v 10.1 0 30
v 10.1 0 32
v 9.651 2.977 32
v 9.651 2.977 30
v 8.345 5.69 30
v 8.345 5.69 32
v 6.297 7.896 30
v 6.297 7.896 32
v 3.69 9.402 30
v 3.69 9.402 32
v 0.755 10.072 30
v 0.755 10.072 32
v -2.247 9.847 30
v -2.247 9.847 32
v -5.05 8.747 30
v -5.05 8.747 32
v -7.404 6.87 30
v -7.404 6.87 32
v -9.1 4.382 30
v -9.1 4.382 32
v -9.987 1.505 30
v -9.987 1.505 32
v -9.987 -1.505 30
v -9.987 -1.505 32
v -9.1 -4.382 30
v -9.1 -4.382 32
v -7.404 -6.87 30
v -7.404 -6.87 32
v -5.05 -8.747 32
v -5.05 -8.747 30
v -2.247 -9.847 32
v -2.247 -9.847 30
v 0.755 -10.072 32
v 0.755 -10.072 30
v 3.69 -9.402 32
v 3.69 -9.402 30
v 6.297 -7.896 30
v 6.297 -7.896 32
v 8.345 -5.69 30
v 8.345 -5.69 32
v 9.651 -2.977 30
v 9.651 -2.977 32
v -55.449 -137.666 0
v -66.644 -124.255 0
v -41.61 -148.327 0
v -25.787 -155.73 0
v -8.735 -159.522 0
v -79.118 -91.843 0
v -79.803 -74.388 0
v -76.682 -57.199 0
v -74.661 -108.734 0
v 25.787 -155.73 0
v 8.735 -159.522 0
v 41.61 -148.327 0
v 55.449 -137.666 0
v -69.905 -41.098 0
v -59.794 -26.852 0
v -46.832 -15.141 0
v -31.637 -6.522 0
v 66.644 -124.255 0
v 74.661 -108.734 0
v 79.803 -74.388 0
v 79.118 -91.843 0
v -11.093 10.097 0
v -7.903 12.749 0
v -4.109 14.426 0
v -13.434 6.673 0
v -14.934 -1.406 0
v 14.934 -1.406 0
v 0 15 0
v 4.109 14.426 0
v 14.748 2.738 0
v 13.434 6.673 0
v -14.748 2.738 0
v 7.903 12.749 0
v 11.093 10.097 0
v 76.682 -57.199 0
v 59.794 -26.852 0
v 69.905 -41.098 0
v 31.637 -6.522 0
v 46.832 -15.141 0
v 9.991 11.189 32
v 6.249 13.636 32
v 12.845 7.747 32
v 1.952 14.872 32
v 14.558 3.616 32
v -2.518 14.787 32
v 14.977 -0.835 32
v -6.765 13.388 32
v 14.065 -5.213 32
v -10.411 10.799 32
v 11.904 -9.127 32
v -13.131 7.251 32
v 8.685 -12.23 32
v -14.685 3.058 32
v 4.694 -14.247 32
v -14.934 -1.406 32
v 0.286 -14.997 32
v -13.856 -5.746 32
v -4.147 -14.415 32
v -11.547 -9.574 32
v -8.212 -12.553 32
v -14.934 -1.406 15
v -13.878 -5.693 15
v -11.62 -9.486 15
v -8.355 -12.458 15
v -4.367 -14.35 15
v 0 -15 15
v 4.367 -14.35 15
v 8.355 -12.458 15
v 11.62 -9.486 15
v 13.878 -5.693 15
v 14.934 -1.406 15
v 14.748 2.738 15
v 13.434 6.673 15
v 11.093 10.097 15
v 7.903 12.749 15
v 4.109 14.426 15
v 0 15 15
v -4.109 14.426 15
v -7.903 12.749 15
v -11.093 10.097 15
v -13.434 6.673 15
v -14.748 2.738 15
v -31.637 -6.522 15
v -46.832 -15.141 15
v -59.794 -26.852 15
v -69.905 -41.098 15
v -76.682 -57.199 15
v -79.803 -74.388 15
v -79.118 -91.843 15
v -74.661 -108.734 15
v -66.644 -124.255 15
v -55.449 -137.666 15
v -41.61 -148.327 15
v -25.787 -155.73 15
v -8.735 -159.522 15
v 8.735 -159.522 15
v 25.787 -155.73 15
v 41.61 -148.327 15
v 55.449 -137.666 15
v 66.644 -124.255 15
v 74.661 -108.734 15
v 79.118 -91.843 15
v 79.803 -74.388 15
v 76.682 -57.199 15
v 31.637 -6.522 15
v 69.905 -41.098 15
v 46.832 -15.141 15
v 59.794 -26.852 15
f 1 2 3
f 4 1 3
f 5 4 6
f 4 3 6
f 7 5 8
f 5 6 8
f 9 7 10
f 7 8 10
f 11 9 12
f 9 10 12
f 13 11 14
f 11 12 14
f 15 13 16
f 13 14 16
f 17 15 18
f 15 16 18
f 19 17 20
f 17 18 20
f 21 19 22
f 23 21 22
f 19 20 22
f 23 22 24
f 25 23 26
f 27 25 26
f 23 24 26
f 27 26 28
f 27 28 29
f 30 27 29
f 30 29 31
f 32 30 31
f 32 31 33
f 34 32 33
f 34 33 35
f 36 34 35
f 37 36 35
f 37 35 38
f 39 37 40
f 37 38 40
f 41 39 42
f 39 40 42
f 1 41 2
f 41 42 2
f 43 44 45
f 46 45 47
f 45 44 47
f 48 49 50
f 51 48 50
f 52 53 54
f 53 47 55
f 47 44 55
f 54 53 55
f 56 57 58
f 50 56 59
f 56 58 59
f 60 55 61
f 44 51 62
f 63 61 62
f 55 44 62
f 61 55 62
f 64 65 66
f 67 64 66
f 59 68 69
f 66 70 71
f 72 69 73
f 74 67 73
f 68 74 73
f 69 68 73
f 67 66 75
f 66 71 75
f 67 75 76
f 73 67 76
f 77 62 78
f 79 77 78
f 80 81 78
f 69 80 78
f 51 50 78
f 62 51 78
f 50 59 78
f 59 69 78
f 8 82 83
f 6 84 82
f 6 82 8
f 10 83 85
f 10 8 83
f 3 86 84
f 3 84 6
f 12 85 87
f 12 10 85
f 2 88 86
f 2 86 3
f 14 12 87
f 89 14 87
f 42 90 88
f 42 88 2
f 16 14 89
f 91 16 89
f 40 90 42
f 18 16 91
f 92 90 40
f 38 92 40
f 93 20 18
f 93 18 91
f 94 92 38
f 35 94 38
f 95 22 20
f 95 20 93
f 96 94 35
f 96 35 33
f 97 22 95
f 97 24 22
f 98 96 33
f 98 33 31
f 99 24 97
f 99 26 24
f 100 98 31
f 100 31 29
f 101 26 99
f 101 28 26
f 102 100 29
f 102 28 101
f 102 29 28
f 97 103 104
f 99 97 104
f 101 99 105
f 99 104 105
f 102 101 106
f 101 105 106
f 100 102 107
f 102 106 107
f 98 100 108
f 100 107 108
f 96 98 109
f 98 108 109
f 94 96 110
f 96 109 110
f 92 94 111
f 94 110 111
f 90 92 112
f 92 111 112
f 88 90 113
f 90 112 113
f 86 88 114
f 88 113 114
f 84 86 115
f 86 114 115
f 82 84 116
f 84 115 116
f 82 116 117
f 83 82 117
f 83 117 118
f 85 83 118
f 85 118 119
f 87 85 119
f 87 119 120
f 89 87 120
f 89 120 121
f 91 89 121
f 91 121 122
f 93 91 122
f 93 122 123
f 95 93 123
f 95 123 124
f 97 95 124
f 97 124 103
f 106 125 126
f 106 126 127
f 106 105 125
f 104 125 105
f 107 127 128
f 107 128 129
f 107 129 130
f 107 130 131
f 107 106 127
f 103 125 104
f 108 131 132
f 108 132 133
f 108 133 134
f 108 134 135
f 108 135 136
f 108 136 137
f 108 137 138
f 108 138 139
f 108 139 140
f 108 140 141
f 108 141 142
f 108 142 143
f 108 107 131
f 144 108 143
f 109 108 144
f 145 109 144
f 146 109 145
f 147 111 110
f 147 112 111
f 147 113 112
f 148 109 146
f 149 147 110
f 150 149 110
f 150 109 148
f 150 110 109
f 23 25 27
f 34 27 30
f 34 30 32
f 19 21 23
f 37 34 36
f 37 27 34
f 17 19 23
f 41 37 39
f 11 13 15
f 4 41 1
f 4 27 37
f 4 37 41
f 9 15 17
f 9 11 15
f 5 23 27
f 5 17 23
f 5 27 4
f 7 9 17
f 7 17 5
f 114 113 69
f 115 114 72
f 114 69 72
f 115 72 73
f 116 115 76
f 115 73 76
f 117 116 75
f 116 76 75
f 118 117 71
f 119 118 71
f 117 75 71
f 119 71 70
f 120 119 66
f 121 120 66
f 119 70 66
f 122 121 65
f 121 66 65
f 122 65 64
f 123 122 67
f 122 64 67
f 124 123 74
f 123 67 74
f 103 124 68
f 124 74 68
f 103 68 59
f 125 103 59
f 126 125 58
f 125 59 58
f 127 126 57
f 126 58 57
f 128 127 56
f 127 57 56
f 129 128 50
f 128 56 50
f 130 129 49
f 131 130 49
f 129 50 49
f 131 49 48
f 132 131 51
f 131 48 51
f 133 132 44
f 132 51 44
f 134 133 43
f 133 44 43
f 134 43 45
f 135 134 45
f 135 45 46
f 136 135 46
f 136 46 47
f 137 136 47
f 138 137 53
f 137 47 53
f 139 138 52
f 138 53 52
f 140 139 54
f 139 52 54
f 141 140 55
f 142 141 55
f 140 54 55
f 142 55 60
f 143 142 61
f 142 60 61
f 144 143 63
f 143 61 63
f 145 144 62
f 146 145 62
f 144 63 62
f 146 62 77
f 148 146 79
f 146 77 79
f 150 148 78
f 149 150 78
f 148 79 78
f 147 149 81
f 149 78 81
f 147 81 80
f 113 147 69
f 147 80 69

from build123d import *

# Parameters (mm, degrees)
EXTRUDE_1_DEPTH     = 15
SKETCH_5_R          = 15
EXTRUDE_3_DEPTH     = 17
SKETCH_9_R          = 10.1
CUT_EXTRUDE_2_DEPTH = 2


with BuildPart() as part:
    # ｽｹｯﾁ4 → ﾎﾞｽ - 押し出し1 (new body)
    with BuildSketch(Plane.XY):
        with BuildLine():
            ThreePointArc((14.933936552, -1.40625), (0, 15), (-14.933936552, -1.40625))
            ThreePointArc((-14.933936552, -1.40625), (0, -160), (14.933936552, -1.40625))
        make_face()
    extrude(amount=EXTRUDE_1_DEPTH)

    # ｽｹｯﾁ5 → ﾎﾞｽ - 押し出し3 (add)
    with BuildSketch(Plane.XY.offset(15)):
        with Locations(Location((0, 0, 0), (0, 0, 185.379378991))):
            Circle(SKETCH_5_R)
    extrude(amount=EXTRUDE_3_DEPTH)

    # ｽｹｯﾁ9 → ｶｯﾄ - 押し出し2 (cut)
    with BuildSketch(Plane.XY.offset(32)):
        Circle(SKETCH_9_R)
    extrude(amount=-CUT_EXTRUDE_2_DEPTH, mode=Mode.SUBTRACT)


solid = part.part
